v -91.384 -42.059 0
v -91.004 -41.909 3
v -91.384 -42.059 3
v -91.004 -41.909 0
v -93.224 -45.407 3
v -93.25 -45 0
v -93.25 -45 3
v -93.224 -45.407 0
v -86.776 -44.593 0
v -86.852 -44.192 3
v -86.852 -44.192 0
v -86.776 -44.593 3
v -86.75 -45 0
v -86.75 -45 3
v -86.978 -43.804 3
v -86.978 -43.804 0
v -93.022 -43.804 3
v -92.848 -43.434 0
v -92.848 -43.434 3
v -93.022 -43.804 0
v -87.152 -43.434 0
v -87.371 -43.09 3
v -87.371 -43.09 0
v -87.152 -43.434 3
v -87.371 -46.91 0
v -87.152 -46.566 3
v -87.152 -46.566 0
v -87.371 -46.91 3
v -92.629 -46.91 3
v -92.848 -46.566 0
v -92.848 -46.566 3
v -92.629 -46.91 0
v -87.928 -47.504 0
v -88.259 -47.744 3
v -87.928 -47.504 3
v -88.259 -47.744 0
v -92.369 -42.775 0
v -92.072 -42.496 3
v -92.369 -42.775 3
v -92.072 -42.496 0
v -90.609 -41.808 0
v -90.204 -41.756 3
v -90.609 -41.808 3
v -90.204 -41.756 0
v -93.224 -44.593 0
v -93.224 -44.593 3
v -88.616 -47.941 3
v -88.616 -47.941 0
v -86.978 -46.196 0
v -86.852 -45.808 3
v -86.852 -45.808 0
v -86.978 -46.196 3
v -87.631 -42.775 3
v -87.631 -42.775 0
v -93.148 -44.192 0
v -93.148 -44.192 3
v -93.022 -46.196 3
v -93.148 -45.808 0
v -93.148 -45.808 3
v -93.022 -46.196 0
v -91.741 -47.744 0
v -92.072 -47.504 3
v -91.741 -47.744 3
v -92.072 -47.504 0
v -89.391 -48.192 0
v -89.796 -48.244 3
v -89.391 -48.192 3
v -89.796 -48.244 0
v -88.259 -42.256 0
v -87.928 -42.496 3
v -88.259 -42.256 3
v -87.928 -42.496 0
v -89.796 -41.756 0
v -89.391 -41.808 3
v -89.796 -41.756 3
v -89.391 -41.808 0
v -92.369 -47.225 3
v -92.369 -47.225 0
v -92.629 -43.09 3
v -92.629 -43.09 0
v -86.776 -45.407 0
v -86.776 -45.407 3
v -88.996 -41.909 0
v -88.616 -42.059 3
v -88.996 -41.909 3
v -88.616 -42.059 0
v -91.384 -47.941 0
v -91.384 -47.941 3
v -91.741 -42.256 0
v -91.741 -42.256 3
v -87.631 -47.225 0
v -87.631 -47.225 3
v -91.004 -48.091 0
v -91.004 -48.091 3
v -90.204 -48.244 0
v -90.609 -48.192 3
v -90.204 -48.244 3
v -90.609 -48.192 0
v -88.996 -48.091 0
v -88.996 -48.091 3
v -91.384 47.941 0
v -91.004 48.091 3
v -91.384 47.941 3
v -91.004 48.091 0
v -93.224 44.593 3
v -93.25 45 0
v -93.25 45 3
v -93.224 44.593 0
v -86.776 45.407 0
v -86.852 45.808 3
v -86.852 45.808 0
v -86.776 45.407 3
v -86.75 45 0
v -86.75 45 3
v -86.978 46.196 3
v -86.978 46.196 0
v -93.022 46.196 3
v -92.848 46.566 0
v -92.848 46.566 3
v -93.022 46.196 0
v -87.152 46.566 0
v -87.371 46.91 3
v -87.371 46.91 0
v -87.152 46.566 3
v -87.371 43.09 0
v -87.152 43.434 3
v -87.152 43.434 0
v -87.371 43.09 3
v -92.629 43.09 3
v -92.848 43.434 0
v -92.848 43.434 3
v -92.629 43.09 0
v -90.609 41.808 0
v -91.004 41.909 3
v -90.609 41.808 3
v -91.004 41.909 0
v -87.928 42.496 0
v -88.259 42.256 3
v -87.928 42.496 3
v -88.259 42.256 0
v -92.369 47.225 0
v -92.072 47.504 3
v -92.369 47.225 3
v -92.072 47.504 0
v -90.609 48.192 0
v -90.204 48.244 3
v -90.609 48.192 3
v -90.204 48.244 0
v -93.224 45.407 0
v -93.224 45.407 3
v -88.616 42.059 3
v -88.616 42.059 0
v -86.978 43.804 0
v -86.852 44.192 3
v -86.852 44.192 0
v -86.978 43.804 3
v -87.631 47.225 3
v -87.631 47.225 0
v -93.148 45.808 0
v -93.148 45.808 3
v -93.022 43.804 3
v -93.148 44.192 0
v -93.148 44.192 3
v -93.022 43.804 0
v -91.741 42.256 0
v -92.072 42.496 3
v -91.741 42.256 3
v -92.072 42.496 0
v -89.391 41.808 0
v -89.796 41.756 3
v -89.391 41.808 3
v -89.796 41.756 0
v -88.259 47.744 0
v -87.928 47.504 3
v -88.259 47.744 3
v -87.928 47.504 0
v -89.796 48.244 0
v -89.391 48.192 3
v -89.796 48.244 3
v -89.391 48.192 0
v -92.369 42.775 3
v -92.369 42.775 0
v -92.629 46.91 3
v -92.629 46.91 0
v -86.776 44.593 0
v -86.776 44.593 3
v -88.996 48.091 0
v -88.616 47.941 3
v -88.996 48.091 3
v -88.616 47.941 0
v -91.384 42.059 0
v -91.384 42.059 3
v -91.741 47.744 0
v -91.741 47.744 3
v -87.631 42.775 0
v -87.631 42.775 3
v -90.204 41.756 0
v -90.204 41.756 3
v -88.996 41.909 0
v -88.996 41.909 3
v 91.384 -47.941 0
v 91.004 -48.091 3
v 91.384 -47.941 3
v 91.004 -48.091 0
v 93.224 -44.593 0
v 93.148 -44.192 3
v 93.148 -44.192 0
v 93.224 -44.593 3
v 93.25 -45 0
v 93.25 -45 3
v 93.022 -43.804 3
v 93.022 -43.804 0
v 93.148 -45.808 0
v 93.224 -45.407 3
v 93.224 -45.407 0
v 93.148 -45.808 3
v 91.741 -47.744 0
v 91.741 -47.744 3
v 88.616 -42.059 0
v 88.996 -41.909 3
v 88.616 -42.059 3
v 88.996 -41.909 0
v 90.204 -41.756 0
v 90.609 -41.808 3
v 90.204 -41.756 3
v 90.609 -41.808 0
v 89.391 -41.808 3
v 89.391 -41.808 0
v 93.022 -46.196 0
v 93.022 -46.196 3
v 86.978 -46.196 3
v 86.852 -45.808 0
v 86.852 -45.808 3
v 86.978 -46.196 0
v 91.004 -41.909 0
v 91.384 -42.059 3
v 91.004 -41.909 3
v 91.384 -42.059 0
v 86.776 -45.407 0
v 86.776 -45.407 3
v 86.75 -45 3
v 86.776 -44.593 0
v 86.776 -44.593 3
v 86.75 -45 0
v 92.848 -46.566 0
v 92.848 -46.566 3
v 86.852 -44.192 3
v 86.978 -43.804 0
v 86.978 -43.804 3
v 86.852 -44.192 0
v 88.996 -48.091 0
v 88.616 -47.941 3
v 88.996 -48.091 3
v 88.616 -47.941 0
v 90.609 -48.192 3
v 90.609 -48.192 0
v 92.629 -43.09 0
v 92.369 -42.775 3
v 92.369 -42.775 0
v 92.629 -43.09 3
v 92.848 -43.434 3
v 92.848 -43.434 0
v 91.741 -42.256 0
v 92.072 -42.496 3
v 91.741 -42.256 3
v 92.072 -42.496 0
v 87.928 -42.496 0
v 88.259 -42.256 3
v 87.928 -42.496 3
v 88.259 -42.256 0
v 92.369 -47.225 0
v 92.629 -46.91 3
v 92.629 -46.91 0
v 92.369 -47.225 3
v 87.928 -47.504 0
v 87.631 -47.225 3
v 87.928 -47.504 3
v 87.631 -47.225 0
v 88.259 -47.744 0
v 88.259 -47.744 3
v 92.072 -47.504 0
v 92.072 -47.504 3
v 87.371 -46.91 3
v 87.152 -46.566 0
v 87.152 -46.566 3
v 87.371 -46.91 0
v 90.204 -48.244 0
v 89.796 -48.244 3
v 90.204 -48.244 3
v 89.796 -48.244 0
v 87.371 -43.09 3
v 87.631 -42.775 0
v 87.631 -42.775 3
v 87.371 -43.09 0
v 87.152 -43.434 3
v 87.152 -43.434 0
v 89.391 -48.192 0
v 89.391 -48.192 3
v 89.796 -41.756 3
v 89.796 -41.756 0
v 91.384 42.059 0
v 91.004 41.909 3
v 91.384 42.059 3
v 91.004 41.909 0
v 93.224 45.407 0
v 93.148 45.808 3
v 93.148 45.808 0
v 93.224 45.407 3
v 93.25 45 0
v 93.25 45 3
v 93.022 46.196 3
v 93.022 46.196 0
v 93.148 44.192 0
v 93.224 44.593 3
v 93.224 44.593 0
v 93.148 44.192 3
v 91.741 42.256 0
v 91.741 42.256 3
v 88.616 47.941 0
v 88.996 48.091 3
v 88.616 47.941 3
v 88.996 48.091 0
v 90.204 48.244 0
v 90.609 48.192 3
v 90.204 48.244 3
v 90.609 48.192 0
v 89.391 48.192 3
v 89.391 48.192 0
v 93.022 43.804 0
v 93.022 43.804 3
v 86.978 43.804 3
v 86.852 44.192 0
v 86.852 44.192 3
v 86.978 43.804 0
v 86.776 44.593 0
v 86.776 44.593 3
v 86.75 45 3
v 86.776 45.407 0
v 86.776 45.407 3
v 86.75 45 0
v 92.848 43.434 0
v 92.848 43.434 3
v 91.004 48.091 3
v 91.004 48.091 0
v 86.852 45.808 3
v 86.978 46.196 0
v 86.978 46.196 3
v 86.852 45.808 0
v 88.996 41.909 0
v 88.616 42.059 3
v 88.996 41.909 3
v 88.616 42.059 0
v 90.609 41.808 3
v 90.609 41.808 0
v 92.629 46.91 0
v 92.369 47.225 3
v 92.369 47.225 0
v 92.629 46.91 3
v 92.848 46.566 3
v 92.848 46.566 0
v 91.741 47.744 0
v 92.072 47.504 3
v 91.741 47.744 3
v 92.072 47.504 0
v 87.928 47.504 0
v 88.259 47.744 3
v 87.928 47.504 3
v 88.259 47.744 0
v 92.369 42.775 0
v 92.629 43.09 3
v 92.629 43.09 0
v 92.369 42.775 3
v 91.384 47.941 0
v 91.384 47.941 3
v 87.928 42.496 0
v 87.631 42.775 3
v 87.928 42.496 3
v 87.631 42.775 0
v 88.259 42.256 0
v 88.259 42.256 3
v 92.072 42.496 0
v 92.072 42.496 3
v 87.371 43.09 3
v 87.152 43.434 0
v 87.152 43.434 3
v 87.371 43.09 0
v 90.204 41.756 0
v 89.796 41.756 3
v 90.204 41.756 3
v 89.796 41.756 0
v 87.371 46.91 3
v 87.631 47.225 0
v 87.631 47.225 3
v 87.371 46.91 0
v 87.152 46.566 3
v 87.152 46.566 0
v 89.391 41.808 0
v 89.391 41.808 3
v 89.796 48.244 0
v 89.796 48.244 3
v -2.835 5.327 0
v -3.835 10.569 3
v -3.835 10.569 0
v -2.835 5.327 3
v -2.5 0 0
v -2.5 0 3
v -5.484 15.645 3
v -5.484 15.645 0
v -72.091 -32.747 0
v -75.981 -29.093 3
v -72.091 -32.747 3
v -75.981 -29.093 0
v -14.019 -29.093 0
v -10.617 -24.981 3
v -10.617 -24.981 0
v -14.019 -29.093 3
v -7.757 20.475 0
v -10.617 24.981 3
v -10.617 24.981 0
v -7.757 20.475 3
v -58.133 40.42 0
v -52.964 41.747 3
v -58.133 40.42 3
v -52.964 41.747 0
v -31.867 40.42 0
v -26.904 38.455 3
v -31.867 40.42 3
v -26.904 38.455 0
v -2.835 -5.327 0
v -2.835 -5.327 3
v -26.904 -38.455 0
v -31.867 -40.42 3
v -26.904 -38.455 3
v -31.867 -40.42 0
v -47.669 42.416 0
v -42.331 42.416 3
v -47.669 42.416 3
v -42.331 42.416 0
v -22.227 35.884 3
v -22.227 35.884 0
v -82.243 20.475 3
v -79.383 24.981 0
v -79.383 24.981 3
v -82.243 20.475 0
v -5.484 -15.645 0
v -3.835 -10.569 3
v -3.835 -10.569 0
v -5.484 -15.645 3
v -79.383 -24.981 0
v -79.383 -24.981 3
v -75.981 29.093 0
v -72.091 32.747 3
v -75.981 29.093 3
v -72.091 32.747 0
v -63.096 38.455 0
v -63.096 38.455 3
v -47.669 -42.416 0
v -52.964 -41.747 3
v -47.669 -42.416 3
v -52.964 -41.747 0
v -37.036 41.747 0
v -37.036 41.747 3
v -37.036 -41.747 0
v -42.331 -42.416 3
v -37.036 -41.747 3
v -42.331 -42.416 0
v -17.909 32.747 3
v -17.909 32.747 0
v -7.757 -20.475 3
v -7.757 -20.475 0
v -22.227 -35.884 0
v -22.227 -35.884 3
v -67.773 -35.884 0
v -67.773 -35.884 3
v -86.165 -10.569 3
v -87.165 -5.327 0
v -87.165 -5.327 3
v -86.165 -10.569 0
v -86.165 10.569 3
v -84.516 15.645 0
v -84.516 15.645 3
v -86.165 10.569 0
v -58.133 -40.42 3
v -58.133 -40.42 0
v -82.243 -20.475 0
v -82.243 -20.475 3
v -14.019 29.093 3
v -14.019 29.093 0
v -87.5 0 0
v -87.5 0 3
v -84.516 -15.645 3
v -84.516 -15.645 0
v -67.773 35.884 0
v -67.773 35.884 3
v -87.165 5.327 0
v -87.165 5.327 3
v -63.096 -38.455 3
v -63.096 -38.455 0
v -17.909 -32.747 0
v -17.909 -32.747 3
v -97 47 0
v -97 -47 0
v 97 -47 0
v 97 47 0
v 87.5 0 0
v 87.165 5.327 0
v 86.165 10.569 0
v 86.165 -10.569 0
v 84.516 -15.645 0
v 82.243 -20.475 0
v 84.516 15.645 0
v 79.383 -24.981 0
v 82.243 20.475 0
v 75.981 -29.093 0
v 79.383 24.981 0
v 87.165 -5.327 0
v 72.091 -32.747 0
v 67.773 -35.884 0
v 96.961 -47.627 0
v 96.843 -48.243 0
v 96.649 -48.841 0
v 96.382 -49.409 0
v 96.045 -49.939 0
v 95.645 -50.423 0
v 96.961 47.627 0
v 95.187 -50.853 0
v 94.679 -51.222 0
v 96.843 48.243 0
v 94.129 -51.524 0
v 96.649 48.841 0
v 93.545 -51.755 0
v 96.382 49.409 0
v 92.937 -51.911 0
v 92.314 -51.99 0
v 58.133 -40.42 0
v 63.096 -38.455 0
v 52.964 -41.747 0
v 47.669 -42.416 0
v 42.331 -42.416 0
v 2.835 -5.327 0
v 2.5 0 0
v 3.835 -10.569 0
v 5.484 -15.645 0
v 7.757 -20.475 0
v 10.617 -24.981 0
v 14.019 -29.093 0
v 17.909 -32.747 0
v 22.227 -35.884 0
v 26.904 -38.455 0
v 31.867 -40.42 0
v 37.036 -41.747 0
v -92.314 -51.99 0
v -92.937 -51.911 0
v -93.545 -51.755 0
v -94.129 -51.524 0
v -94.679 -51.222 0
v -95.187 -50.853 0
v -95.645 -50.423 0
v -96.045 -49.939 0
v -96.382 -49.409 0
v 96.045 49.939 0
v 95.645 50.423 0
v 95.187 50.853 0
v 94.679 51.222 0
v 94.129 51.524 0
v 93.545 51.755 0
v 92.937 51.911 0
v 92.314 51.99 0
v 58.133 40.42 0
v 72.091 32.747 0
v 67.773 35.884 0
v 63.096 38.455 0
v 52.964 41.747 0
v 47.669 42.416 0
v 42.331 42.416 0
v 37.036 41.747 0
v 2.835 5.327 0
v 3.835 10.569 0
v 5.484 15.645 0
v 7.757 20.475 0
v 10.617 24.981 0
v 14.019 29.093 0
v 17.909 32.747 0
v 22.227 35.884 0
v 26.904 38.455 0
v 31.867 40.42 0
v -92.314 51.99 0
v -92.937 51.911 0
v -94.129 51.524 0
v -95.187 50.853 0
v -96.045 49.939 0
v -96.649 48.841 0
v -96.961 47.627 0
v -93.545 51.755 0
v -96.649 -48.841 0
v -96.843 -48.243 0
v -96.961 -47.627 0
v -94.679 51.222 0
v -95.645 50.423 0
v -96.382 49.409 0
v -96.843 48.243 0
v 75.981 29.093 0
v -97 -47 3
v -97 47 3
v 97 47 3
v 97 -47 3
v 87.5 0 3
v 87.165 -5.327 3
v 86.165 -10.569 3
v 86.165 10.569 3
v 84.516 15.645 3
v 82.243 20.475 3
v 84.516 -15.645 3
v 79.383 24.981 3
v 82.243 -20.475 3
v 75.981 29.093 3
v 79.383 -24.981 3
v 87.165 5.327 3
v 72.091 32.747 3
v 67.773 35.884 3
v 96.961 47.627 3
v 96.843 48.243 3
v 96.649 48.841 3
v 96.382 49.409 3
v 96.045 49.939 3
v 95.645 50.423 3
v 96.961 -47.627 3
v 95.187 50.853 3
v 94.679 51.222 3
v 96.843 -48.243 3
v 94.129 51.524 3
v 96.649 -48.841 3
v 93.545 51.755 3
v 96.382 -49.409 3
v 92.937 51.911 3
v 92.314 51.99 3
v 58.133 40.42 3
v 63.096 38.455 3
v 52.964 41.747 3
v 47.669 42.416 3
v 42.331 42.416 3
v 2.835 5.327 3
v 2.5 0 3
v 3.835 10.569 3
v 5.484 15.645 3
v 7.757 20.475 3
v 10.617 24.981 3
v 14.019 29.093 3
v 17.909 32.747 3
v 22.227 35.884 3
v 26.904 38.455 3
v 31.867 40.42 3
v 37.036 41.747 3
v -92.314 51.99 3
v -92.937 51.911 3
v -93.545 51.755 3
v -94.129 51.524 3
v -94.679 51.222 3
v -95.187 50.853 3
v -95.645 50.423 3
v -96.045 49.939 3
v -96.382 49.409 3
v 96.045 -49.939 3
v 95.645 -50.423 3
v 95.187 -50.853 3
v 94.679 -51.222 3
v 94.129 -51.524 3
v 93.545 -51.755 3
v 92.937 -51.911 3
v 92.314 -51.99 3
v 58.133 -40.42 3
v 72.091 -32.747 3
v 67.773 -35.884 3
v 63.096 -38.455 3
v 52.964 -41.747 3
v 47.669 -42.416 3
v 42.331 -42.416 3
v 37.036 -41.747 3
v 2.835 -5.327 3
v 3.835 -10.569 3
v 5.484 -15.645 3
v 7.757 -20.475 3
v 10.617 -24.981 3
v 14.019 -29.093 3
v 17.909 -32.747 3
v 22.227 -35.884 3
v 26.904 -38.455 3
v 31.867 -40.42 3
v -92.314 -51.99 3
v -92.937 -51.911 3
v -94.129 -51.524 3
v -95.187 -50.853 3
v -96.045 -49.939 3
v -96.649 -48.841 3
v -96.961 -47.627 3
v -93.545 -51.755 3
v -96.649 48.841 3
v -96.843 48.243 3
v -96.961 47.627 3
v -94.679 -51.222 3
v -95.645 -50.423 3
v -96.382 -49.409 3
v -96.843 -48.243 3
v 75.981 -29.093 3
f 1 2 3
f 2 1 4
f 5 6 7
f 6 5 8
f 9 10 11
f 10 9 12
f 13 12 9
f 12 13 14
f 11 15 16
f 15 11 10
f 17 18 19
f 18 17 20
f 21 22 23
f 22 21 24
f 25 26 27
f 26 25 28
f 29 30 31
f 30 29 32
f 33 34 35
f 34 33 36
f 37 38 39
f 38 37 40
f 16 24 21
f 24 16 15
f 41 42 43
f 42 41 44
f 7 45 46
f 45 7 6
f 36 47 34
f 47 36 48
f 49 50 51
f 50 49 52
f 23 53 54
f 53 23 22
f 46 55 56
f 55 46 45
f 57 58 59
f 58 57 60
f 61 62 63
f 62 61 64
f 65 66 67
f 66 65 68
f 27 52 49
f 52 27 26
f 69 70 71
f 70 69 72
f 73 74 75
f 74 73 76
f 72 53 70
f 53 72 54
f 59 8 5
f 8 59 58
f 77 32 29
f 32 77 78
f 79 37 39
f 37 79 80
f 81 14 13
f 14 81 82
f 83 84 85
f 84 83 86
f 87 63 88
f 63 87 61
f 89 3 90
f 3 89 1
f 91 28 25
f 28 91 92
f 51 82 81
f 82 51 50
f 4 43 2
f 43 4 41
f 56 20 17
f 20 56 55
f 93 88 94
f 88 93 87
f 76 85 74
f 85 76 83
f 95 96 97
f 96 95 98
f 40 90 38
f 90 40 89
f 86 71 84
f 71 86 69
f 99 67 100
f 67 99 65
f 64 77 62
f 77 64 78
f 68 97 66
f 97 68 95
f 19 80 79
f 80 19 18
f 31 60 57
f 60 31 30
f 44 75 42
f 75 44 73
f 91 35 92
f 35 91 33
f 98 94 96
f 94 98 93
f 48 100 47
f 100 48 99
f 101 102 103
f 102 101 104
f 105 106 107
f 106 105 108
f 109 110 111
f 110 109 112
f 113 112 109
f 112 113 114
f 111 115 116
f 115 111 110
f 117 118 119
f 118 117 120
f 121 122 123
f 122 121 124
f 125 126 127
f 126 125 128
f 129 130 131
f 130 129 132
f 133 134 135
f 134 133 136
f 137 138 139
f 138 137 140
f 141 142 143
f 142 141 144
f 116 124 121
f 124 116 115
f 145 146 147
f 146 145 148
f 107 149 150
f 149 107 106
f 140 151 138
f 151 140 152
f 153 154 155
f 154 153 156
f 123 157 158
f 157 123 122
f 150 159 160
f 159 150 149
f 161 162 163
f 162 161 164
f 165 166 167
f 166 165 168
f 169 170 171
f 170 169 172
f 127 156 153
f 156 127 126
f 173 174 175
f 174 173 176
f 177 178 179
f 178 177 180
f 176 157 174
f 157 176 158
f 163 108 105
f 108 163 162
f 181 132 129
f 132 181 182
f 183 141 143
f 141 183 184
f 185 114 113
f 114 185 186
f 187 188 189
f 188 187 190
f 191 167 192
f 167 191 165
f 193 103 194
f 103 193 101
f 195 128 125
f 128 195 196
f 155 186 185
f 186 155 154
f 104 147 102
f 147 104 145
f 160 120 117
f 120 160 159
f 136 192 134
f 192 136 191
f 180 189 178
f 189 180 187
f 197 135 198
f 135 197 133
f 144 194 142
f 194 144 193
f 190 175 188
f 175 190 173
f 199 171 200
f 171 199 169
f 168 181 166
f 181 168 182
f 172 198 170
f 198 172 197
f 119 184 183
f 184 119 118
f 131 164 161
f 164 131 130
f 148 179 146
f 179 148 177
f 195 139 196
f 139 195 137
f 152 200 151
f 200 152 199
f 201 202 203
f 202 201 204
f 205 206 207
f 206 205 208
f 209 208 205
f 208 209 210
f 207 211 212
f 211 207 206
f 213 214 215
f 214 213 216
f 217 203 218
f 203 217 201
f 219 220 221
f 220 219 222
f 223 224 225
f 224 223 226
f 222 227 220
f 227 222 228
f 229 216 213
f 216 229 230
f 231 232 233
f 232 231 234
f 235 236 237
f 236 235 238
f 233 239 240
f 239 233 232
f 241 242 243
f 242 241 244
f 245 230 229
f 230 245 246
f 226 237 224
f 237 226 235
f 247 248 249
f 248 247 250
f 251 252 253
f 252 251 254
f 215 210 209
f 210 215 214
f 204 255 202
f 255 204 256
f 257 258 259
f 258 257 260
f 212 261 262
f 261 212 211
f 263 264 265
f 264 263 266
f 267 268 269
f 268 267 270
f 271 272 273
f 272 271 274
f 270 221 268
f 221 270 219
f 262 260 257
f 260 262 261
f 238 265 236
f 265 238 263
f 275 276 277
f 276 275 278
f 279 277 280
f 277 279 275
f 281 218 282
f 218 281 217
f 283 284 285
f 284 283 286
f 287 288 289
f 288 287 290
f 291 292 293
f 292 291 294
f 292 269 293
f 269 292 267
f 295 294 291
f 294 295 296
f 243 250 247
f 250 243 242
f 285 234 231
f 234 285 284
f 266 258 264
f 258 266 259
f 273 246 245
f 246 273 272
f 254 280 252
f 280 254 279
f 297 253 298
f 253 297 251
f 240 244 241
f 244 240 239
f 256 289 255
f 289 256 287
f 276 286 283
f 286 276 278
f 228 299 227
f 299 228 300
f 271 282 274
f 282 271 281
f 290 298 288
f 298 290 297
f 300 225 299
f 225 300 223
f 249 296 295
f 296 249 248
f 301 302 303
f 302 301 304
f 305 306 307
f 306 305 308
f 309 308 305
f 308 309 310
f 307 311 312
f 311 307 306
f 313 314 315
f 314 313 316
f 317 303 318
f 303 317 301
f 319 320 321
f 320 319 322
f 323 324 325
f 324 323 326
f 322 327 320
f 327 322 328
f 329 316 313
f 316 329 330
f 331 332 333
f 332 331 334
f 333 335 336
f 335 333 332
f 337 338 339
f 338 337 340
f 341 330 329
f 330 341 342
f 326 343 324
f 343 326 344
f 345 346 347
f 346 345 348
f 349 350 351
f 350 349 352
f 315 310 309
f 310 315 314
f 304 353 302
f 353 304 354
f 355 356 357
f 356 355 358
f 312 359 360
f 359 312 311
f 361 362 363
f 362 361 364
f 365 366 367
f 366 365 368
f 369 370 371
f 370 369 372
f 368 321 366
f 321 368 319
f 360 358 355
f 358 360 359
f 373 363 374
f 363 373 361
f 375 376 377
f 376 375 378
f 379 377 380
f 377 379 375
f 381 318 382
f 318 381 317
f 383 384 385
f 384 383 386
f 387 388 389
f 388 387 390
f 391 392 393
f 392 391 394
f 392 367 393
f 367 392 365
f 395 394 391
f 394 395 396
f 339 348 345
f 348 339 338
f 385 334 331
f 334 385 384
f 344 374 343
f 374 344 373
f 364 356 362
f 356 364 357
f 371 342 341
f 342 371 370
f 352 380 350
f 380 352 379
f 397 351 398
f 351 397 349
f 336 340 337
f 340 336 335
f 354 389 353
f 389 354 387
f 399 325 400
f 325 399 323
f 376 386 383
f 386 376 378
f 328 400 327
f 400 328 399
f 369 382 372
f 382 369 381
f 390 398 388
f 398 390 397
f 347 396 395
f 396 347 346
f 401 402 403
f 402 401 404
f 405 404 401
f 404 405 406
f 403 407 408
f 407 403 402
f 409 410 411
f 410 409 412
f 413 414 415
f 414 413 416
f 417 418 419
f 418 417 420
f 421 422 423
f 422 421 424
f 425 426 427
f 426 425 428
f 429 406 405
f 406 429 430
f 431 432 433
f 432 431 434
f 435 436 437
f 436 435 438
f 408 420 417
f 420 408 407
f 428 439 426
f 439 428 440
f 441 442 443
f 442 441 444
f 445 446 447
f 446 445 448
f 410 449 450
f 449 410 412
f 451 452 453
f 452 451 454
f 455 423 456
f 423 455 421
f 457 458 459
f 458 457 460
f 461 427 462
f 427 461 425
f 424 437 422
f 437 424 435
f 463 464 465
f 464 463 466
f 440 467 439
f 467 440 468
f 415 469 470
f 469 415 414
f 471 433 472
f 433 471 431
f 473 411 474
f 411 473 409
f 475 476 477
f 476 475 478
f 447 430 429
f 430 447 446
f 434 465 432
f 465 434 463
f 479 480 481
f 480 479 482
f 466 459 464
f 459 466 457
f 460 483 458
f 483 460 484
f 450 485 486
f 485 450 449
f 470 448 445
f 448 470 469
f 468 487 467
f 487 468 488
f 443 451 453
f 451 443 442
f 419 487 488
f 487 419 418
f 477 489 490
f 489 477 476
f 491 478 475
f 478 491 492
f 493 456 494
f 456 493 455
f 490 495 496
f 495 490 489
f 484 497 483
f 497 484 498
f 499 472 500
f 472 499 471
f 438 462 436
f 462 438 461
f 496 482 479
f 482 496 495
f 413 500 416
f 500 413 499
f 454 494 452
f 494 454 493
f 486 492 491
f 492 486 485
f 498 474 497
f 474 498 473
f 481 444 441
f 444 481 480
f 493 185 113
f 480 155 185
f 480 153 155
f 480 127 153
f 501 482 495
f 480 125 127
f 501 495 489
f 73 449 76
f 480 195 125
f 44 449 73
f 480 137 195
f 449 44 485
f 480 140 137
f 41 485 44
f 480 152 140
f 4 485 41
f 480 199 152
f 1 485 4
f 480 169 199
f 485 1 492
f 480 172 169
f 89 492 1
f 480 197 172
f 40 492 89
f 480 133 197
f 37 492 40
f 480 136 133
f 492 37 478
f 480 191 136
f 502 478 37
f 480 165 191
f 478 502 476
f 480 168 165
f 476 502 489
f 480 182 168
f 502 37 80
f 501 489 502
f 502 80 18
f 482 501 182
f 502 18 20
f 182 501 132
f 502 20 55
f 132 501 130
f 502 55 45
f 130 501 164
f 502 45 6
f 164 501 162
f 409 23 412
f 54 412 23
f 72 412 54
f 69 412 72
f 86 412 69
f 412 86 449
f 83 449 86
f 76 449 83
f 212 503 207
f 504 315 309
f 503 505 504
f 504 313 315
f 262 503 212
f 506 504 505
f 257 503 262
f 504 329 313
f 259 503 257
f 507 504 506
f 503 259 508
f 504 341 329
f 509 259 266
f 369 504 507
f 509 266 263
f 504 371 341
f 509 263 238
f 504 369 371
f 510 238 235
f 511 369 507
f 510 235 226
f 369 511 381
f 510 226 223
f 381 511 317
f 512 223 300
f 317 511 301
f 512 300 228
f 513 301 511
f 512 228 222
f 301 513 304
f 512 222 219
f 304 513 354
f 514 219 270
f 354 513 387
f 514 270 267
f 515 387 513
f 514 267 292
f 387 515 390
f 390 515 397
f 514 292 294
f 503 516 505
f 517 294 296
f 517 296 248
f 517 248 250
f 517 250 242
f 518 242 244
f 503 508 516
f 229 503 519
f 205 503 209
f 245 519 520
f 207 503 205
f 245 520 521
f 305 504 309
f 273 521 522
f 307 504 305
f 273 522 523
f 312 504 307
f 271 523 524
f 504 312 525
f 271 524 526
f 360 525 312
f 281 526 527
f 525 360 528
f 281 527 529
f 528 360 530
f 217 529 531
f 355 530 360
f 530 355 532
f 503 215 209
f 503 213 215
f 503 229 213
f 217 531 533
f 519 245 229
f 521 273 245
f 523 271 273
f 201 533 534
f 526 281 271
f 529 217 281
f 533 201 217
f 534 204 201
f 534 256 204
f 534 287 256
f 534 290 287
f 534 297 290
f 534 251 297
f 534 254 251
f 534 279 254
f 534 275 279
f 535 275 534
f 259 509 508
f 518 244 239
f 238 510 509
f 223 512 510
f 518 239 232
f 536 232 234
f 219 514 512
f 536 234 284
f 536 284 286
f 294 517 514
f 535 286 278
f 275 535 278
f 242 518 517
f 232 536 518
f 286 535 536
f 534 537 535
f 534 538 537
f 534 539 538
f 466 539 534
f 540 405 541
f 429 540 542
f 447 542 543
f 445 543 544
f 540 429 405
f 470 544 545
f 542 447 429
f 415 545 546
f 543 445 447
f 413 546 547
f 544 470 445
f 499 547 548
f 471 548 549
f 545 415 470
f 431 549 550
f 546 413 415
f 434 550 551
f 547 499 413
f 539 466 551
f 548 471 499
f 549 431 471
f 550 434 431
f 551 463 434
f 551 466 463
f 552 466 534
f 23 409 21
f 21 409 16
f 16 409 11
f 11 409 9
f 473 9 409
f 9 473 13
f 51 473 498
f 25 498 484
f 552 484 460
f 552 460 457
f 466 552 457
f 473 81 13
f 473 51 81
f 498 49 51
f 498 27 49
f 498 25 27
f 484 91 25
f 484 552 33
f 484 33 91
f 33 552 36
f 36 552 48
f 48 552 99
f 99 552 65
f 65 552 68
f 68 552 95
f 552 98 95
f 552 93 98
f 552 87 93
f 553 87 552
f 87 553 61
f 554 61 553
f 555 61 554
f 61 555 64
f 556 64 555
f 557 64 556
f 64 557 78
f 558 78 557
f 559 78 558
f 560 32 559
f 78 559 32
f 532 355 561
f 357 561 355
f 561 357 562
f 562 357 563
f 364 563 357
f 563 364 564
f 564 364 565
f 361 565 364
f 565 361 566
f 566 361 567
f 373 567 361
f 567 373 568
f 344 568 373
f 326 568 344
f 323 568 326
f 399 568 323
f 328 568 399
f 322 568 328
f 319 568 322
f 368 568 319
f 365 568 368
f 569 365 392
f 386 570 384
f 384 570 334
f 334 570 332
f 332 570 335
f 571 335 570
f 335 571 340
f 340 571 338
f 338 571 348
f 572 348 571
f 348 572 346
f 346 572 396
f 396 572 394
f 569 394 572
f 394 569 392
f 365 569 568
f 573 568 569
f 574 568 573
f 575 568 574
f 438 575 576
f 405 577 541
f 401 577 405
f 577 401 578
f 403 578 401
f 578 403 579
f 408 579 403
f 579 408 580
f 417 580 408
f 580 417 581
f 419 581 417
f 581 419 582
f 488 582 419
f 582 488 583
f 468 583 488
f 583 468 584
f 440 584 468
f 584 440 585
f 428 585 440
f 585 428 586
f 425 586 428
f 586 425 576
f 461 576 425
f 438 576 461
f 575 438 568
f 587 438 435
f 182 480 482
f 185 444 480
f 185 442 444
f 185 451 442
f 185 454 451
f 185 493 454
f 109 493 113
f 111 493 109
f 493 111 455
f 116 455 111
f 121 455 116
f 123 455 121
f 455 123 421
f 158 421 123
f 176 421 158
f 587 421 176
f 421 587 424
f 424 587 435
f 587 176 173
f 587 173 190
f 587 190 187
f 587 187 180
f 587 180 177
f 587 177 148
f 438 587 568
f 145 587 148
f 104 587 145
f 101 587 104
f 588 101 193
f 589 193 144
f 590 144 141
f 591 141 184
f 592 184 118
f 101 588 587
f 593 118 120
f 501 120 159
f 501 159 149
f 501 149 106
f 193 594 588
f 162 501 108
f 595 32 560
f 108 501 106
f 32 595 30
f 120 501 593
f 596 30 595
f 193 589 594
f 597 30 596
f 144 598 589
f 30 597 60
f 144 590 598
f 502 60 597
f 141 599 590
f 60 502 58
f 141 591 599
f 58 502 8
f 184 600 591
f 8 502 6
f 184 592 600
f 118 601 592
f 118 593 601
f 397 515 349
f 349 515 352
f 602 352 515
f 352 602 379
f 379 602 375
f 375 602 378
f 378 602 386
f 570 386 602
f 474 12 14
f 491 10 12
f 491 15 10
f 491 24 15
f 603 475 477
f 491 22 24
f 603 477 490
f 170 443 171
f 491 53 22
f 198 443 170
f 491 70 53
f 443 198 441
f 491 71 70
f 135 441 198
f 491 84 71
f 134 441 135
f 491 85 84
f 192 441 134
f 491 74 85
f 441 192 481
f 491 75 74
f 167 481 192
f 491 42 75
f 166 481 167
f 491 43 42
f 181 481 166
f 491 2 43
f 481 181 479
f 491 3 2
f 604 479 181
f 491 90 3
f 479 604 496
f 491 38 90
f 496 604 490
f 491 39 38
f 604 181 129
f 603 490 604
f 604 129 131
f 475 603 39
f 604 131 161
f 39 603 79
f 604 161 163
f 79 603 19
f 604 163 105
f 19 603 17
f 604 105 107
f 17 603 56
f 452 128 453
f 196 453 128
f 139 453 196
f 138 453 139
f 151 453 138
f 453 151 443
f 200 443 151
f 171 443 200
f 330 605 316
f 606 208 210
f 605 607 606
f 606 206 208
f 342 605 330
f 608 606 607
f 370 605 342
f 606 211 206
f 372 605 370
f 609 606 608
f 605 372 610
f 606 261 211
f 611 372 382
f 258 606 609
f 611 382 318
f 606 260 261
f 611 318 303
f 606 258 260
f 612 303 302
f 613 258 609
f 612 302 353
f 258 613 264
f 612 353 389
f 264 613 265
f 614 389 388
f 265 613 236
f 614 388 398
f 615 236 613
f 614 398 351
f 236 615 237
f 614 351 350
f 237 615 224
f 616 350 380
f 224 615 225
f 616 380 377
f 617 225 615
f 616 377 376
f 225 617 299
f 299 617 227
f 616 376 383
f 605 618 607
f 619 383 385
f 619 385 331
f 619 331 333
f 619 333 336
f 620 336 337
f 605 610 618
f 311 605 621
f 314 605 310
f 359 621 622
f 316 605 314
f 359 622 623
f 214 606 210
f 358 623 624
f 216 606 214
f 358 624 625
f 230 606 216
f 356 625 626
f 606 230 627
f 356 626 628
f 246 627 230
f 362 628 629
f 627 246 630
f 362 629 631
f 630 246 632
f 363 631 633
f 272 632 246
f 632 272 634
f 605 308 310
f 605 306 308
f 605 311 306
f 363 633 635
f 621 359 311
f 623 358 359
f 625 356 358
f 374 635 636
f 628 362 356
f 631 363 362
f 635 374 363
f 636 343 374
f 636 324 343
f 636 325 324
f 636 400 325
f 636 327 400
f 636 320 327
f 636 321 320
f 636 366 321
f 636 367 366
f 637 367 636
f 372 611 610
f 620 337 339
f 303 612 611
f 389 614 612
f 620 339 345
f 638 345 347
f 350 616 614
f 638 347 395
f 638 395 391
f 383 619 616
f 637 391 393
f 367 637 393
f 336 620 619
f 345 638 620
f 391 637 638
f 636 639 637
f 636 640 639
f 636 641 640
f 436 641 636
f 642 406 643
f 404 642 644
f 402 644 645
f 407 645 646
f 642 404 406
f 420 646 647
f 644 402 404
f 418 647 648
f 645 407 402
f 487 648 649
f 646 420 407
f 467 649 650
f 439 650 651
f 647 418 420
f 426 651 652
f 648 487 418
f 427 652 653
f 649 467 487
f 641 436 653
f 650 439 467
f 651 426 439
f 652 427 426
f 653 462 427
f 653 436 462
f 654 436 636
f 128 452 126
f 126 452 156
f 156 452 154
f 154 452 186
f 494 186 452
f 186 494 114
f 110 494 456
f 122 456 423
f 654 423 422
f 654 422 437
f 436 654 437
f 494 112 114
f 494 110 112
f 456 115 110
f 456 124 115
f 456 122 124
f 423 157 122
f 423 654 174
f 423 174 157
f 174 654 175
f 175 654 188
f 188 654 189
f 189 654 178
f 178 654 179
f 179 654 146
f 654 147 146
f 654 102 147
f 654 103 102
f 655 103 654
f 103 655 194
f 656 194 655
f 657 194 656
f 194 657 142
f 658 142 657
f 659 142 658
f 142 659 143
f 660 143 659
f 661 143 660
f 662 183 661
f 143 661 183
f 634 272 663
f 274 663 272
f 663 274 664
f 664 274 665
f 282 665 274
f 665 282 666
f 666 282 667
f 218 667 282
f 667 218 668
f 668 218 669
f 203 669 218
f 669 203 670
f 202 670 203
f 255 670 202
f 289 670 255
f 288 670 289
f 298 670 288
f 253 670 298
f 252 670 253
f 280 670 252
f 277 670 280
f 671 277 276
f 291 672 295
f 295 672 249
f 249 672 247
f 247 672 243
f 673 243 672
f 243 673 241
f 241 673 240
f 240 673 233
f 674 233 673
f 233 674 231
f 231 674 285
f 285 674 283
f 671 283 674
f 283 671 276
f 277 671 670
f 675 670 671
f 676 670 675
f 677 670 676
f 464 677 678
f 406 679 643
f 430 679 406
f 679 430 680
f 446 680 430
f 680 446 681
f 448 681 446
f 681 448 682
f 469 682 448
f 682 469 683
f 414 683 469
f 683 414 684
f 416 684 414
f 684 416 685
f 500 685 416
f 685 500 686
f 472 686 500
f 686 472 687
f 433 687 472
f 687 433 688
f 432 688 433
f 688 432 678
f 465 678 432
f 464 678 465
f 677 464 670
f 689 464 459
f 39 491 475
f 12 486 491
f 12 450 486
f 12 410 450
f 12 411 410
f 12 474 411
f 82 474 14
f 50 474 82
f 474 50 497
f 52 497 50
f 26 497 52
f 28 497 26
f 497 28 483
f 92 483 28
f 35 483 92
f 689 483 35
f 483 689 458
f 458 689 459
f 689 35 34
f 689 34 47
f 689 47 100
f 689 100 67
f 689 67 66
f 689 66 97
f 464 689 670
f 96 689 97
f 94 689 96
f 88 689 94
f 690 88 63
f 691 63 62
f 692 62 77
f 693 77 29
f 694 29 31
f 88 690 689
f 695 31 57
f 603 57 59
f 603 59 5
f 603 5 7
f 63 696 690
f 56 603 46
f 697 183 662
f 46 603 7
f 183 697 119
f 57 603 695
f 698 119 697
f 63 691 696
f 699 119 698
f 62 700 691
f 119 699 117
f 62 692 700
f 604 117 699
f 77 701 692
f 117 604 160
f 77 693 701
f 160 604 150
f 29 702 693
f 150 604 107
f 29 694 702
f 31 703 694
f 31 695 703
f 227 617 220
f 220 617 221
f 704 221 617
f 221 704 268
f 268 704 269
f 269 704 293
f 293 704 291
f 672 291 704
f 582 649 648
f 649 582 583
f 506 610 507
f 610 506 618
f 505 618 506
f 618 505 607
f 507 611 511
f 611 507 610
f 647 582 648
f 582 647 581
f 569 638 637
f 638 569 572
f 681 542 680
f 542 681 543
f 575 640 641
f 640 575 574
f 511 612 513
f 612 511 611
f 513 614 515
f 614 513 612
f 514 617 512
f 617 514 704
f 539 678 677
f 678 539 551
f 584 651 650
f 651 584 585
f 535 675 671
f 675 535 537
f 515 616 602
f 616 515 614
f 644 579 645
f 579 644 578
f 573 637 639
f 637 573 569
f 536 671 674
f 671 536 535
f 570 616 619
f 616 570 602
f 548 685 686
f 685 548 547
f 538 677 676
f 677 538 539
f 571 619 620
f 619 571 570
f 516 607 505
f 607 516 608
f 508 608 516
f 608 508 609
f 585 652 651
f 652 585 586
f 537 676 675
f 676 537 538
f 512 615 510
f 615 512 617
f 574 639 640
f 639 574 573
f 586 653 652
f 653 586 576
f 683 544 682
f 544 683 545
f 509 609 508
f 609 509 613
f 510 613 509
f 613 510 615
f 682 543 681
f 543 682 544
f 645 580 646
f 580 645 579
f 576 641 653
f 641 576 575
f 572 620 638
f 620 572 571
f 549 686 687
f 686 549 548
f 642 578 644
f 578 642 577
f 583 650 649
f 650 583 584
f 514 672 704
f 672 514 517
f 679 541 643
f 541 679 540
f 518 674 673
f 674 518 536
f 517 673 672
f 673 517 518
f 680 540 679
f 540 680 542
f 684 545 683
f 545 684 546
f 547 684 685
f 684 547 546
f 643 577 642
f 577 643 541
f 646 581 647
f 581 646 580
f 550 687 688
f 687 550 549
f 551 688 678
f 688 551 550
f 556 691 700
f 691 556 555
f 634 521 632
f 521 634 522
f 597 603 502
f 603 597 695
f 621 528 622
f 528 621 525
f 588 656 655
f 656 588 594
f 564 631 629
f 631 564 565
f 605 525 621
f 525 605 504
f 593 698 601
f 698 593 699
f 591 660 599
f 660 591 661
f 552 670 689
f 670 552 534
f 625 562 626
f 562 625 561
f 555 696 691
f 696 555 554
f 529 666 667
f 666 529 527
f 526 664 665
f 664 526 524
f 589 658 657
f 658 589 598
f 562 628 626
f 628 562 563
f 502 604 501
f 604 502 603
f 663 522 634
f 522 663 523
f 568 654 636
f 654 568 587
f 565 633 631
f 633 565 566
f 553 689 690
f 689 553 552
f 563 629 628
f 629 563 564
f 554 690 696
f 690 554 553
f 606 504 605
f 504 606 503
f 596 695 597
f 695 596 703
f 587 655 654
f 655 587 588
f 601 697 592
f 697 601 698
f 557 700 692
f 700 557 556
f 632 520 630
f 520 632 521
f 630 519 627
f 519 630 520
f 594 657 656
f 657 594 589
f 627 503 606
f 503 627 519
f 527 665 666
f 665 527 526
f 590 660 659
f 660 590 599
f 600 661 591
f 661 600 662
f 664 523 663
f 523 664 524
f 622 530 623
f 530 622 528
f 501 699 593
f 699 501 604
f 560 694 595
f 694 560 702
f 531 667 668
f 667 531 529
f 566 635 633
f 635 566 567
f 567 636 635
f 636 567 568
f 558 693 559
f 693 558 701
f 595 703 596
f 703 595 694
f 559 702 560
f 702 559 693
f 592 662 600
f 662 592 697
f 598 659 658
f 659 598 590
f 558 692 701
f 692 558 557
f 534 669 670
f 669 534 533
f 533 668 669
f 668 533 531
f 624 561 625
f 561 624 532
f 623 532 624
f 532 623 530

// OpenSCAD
$fn = 50;


difference() {
	union() {
		hull() {
			translate(v = [-92.0000000000, 47.0000000000, 0]) {
				cylinder(h = 3, r = 5);
			}
			translate(v = [92.0000000000, 47.0000000000, 0]) {
				cylinder(h = 3, r = 5);
			}
			translate(v = [-92.0000000000, -47.0000000000, 0]) {
				cylinder(h = 3, r = 5);
			}
			translate(v = [92.0000000000, -47.0000000000, 0]) {
				cylinder(h = 3, r = 5);
			}
		}
	}
	union() {
		#translate(v = [-90.0000000000, -45.0000000000, -100.0000000000]) {
			cylinder(h = 200, r = 3.2500000000);
		}
		#translate(v = [-90.0000000000, 45.0000000000, -100.0000000000]) {
			cylinder(h = 200, r = 3.2500000000);
		}
		#translate(v = [90.0000000000, -45.0000000000, -100.0000000000]) {
			cylinder(h = 200, r = 3.2500000000);
		}
		#translate(v = [90.0000000000, 45.0000000000, -100.0000000000]) {
			cylinder(h = 200, r = 3.2500000000);
		}
		#translate(v = [-45.0000000000, 0, 0]) {
			cylinder(h = 3, r = 42.5000000000);
		}
		#translate(v = [45.0000000000, 0, 0]) {
			cylinder(h = 3, r = 42.5000000000);
		}
	}
}
